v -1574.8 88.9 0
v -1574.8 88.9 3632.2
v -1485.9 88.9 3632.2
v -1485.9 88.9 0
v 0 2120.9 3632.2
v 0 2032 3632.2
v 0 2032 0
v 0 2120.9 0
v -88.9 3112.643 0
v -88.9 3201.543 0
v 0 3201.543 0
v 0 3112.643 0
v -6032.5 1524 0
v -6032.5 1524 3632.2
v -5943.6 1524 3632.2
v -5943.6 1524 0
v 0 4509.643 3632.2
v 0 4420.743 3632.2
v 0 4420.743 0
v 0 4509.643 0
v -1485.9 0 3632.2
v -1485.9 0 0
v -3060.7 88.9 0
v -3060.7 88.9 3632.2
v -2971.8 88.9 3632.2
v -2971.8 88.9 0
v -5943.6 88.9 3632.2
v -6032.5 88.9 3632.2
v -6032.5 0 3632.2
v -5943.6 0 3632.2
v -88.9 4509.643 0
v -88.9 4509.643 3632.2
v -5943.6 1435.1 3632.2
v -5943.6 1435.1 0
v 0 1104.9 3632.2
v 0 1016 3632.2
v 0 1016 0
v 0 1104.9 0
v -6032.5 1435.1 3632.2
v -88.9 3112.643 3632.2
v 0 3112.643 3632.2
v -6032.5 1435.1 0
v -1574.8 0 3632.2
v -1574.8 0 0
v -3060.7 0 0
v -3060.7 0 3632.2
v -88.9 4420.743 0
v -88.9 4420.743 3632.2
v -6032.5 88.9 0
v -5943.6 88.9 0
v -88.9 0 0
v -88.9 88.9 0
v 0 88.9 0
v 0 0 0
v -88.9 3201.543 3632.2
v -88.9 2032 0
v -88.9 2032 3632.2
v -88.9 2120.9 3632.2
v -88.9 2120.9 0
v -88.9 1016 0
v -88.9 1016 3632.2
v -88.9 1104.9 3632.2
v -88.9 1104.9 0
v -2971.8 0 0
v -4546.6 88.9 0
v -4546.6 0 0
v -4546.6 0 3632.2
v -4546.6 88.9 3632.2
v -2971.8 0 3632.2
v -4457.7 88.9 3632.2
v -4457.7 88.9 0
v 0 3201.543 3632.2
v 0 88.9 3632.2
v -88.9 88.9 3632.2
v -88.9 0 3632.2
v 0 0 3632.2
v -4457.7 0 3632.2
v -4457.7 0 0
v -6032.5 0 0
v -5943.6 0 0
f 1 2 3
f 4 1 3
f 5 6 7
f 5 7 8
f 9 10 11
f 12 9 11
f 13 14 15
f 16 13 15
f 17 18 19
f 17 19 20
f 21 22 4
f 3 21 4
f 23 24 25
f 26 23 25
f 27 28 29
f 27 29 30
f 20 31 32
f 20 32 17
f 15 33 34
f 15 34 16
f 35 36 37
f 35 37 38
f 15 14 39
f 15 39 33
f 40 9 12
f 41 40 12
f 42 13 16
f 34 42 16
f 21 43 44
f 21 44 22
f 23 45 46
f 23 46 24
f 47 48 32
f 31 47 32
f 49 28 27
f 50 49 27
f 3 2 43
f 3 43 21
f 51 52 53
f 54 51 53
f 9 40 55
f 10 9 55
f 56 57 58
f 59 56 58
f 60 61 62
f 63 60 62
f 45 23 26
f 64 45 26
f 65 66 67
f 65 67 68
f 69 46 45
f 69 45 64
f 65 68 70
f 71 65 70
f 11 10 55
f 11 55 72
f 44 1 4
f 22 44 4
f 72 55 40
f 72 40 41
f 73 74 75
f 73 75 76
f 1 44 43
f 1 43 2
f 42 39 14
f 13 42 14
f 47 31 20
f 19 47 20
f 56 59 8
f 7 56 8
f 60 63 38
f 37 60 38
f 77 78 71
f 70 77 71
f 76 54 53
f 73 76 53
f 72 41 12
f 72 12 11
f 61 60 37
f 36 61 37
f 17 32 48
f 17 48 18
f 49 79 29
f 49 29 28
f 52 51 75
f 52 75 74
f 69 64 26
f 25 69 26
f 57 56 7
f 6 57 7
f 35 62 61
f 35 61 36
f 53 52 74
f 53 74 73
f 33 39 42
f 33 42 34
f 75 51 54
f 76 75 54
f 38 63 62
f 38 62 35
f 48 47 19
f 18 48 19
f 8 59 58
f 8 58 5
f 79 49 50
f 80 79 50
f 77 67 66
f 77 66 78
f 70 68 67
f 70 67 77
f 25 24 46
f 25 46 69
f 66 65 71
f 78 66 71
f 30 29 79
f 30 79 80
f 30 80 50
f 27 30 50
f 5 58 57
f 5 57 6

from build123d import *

# Parameters (mm, degrees)
F0_W     = 88.9
F0_H     = 88.9
F1_DEPTH = 3632.2


with BuildPart() as f1:
    # F0 (on Top) → F1 (new body)
    with BuildSketch(Plane.XY):
        with Locations((-44.45, 44.45)):
            Rectangle(F0_W, F0_H)
        with Locations((-1530.35, 44.45)):
            Rectangle(F0_W, F0_H)
        with Locations((-3016.25, 44.45)):
            Rectangle(F0_W, F0_H)
        with Locations((-4502.15, 44.45)):
            Rectangle(F0_W, F0_H)
        with Locations((-5988.05, 44.45)):
            Rectangle(F0_W, F0_H)
        with Locations((-44.45, 1060.45)):
            Rectangle(F0_W, F0_H)
        with Locations((-44.45, 2076.45)):
            Rectangle(F0_W, F0_H)
        with Locations((-44.45, 4465.193)):
            Rectangle(F0_W, F0_H)
        with Locations((-5988.05, 1479.55)):
            Rectangle(F0_W, F0_H)
        with Locations((-44.45, 3157.093)):
            Rectangle(F0_W, F0_H)
    extrude(amount=F1_DEPTH)


solid = f1.part
